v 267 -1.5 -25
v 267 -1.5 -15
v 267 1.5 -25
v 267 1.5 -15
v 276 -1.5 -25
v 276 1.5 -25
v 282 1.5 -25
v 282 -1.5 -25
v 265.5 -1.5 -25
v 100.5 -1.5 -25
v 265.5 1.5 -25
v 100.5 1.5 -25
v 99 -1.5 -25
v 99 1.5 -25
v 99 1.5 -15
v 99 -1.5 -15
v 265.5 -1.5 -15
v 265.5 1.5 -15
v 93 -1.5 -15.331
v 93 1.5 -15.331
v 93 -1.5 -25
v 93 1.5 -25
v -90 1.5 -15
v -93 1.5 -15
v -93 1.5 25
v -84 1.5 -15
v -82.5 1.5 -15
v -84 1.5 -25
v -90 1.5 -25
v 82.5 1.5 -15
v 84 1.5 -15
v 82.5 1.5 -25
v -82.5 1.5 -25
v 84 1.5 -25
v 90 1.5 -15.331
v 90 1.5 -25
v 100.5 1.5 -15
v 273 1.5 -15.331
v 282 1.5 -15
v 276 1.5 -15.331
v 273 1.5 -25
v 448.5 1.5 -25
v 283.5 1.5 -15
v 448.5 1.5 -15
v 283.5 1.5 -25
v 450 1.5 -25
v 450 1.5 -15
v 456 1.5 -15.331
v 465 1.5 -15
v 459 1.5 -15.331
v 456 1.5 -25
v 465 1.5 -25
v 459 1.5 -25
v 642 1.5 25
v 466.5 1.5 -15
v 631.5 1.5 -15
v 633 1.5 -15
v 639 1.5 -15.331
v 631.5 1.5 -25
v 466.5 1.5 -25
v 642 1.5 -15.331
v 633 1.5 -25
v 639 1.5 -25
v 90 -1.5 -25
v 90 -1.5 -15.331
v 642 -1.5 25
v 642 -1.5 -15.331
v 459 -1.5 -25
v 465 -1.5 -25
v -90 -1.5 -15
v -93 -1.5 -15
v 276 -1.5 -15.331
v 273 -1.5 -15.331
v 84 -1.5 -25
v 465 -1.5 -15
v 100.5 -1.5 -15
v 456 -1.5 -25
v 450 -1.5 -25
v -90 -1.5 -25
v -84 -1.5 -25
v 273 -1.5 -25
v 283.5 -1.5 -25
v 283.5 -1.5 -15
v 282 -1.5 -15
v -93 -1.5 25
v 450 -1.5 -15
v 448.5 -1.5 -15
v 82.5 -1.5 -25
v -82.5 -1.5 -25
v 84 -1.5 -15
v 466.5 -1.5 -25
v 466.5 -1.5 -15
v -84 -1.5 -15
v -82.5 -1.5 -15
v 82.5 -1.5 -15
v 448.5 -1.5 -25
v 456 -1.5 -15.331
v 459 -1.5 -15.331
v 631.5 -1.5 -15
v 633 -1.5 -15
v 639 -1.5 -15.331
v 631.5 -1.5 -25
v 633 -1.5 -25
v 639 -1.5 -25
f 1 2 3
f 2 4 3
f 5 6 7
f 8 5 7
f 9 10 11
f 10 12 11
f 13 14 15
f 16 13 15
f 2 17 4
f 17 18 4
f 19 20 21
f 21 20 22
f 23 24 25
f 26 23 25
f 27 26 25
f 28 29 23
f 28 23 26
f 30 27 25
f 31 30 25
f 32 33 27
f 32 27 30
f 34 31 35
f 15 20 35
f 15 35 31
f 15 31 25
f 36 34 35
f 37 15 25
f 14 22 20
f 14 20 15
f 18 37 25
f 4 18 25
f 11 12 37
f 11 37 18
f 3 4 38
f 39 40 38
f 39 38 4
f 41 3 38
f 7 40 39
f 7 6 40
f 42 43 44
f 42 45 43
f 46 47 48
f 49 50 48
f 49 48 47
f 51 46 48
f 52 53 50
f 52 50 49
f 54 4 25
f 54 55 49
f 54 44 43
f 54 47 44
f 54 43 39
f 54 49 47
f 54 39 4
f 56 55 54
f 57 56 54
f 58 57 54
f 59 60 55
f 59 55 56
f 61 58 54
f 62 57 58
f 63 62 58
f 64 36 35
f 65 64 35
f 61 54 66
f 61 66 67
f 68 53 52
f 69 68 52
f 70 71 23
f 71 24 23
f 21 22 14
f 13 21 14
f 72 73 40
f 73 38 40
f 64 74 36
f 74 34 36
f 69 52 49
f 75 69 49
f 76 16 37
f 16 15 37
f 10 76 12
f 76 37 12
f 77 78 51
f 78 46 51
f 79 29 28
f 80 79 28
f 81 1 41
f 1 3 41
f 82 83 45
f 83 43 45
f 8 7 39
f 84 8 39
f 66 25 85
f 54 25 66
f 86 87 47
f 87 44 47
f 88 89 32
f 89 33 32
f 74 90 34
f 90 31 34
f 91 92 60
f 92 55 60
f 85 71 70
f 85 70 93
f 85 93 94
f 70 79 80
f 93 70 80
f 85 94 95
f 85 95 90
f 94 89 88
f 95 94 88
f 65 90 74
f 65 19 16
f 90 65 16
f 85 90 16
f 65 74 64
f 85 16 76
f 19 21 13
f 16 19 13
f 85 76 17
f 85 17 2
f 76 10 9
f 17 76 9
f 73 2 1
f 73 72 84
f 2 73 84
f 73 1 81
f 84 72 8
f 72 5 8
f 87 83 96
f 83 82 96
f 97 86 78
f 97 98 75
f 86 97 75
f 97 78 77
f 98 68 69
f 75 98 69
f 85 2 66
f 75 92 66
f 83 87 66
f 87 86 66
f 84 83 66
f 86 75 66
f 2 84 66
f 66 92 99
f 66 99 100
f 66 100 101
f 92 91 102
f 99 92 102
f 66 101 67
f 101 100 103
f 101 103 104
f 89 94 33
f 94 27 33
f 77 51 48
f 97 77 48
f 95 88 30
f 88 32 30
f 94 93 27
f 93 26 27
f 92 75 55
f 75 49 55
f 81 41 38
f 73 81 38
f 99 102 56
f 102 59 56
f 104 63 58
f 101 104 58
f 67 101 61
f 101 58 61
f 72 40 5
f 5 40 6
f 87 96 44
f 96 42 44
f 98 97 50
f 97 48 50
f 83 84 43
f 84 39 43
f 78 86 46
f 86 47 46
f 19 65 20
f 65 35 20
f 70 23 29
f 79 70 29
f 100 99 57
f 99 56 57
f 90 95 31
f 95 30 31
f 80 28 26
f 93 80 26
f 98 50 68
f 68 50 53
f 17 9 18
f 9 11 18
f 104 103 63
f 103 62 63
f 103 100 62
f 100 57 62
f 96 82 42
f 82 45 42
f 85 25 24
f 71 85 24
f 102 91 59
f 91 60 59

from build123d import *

# Parameters (mm, degrees)
BOSS_EXTRUDE1_DEPTH = 1.5
SKETCH2_W           = 3
SKETCH2_H           = 40.331406252
BOSS_EXTRUDE2_DEPTH = 1.5
LPATTERN2_COUNT     = 4
LPATTERN2_PITCH     = 183
SKETCH3_W           = 3
SKETCH3_H           = 40
BOSS_EXTRUDE3_DEPTH = 1.5


with BuildPart() as part:
    # Sketch1 → Boss-Extrude1 (new body, symmetric)
    with BuildSketch(Plane(origin=(0, 0, 0), x_dir=(1, 0, 0), z_dir=(0, 1, 0))):
        Polygon((-84, 25), (-84, 15), (-82.5, 15), (-82.5, 25), (82.5, 25), (82.5, 15), (84, 15), (84, 25), (90, 25), (90, -25), (-90, -25), (-90, 25), align=None)
    boss_extrude1 = extrude(amount=BOSS_EXTRUDE1_DEPTH, both=True)

    # Sketch2 → Boss-Extrude2 (add, symmetric)
    with BuildSketch(Plane(origin=(0, 0, 0), x_dir=(1, 0, 0), z_dir=(0, 1, 0))):
        with Locations((91.5, -4.834296874)):
            Rectangle(SKETCH2_W, SKETCH2_H)
    boss_extrude2 = extrude(amount=BOSS_EXTRUDE2_DEPTH, both=True)

    # LPattern2: Boss-Extrude1, Boss-Extrude2 ×4
    with Locations(*[(i * LPATTERN2_PITCH, 0, 0) for i in range(1, LPATTERN2_COUNT)]):
        add(boss_extrude1)
        add(boss_extrude2)

    # Sketch3 → Boss-Extrude3 (add, symmetric)
    with BuildSketch(Plane(origin=(0, 0, 0), x_dir=(1, 0, 0), z_dir=(0, 1, 0))):
        with Locations((-91.5, -5)):
            Rectangle(SKETCH3_W, SKETCH3_H)
    extrude(amount=BOSS_EXTRUDE3_DEPTH, both=True)


solid = part.part
